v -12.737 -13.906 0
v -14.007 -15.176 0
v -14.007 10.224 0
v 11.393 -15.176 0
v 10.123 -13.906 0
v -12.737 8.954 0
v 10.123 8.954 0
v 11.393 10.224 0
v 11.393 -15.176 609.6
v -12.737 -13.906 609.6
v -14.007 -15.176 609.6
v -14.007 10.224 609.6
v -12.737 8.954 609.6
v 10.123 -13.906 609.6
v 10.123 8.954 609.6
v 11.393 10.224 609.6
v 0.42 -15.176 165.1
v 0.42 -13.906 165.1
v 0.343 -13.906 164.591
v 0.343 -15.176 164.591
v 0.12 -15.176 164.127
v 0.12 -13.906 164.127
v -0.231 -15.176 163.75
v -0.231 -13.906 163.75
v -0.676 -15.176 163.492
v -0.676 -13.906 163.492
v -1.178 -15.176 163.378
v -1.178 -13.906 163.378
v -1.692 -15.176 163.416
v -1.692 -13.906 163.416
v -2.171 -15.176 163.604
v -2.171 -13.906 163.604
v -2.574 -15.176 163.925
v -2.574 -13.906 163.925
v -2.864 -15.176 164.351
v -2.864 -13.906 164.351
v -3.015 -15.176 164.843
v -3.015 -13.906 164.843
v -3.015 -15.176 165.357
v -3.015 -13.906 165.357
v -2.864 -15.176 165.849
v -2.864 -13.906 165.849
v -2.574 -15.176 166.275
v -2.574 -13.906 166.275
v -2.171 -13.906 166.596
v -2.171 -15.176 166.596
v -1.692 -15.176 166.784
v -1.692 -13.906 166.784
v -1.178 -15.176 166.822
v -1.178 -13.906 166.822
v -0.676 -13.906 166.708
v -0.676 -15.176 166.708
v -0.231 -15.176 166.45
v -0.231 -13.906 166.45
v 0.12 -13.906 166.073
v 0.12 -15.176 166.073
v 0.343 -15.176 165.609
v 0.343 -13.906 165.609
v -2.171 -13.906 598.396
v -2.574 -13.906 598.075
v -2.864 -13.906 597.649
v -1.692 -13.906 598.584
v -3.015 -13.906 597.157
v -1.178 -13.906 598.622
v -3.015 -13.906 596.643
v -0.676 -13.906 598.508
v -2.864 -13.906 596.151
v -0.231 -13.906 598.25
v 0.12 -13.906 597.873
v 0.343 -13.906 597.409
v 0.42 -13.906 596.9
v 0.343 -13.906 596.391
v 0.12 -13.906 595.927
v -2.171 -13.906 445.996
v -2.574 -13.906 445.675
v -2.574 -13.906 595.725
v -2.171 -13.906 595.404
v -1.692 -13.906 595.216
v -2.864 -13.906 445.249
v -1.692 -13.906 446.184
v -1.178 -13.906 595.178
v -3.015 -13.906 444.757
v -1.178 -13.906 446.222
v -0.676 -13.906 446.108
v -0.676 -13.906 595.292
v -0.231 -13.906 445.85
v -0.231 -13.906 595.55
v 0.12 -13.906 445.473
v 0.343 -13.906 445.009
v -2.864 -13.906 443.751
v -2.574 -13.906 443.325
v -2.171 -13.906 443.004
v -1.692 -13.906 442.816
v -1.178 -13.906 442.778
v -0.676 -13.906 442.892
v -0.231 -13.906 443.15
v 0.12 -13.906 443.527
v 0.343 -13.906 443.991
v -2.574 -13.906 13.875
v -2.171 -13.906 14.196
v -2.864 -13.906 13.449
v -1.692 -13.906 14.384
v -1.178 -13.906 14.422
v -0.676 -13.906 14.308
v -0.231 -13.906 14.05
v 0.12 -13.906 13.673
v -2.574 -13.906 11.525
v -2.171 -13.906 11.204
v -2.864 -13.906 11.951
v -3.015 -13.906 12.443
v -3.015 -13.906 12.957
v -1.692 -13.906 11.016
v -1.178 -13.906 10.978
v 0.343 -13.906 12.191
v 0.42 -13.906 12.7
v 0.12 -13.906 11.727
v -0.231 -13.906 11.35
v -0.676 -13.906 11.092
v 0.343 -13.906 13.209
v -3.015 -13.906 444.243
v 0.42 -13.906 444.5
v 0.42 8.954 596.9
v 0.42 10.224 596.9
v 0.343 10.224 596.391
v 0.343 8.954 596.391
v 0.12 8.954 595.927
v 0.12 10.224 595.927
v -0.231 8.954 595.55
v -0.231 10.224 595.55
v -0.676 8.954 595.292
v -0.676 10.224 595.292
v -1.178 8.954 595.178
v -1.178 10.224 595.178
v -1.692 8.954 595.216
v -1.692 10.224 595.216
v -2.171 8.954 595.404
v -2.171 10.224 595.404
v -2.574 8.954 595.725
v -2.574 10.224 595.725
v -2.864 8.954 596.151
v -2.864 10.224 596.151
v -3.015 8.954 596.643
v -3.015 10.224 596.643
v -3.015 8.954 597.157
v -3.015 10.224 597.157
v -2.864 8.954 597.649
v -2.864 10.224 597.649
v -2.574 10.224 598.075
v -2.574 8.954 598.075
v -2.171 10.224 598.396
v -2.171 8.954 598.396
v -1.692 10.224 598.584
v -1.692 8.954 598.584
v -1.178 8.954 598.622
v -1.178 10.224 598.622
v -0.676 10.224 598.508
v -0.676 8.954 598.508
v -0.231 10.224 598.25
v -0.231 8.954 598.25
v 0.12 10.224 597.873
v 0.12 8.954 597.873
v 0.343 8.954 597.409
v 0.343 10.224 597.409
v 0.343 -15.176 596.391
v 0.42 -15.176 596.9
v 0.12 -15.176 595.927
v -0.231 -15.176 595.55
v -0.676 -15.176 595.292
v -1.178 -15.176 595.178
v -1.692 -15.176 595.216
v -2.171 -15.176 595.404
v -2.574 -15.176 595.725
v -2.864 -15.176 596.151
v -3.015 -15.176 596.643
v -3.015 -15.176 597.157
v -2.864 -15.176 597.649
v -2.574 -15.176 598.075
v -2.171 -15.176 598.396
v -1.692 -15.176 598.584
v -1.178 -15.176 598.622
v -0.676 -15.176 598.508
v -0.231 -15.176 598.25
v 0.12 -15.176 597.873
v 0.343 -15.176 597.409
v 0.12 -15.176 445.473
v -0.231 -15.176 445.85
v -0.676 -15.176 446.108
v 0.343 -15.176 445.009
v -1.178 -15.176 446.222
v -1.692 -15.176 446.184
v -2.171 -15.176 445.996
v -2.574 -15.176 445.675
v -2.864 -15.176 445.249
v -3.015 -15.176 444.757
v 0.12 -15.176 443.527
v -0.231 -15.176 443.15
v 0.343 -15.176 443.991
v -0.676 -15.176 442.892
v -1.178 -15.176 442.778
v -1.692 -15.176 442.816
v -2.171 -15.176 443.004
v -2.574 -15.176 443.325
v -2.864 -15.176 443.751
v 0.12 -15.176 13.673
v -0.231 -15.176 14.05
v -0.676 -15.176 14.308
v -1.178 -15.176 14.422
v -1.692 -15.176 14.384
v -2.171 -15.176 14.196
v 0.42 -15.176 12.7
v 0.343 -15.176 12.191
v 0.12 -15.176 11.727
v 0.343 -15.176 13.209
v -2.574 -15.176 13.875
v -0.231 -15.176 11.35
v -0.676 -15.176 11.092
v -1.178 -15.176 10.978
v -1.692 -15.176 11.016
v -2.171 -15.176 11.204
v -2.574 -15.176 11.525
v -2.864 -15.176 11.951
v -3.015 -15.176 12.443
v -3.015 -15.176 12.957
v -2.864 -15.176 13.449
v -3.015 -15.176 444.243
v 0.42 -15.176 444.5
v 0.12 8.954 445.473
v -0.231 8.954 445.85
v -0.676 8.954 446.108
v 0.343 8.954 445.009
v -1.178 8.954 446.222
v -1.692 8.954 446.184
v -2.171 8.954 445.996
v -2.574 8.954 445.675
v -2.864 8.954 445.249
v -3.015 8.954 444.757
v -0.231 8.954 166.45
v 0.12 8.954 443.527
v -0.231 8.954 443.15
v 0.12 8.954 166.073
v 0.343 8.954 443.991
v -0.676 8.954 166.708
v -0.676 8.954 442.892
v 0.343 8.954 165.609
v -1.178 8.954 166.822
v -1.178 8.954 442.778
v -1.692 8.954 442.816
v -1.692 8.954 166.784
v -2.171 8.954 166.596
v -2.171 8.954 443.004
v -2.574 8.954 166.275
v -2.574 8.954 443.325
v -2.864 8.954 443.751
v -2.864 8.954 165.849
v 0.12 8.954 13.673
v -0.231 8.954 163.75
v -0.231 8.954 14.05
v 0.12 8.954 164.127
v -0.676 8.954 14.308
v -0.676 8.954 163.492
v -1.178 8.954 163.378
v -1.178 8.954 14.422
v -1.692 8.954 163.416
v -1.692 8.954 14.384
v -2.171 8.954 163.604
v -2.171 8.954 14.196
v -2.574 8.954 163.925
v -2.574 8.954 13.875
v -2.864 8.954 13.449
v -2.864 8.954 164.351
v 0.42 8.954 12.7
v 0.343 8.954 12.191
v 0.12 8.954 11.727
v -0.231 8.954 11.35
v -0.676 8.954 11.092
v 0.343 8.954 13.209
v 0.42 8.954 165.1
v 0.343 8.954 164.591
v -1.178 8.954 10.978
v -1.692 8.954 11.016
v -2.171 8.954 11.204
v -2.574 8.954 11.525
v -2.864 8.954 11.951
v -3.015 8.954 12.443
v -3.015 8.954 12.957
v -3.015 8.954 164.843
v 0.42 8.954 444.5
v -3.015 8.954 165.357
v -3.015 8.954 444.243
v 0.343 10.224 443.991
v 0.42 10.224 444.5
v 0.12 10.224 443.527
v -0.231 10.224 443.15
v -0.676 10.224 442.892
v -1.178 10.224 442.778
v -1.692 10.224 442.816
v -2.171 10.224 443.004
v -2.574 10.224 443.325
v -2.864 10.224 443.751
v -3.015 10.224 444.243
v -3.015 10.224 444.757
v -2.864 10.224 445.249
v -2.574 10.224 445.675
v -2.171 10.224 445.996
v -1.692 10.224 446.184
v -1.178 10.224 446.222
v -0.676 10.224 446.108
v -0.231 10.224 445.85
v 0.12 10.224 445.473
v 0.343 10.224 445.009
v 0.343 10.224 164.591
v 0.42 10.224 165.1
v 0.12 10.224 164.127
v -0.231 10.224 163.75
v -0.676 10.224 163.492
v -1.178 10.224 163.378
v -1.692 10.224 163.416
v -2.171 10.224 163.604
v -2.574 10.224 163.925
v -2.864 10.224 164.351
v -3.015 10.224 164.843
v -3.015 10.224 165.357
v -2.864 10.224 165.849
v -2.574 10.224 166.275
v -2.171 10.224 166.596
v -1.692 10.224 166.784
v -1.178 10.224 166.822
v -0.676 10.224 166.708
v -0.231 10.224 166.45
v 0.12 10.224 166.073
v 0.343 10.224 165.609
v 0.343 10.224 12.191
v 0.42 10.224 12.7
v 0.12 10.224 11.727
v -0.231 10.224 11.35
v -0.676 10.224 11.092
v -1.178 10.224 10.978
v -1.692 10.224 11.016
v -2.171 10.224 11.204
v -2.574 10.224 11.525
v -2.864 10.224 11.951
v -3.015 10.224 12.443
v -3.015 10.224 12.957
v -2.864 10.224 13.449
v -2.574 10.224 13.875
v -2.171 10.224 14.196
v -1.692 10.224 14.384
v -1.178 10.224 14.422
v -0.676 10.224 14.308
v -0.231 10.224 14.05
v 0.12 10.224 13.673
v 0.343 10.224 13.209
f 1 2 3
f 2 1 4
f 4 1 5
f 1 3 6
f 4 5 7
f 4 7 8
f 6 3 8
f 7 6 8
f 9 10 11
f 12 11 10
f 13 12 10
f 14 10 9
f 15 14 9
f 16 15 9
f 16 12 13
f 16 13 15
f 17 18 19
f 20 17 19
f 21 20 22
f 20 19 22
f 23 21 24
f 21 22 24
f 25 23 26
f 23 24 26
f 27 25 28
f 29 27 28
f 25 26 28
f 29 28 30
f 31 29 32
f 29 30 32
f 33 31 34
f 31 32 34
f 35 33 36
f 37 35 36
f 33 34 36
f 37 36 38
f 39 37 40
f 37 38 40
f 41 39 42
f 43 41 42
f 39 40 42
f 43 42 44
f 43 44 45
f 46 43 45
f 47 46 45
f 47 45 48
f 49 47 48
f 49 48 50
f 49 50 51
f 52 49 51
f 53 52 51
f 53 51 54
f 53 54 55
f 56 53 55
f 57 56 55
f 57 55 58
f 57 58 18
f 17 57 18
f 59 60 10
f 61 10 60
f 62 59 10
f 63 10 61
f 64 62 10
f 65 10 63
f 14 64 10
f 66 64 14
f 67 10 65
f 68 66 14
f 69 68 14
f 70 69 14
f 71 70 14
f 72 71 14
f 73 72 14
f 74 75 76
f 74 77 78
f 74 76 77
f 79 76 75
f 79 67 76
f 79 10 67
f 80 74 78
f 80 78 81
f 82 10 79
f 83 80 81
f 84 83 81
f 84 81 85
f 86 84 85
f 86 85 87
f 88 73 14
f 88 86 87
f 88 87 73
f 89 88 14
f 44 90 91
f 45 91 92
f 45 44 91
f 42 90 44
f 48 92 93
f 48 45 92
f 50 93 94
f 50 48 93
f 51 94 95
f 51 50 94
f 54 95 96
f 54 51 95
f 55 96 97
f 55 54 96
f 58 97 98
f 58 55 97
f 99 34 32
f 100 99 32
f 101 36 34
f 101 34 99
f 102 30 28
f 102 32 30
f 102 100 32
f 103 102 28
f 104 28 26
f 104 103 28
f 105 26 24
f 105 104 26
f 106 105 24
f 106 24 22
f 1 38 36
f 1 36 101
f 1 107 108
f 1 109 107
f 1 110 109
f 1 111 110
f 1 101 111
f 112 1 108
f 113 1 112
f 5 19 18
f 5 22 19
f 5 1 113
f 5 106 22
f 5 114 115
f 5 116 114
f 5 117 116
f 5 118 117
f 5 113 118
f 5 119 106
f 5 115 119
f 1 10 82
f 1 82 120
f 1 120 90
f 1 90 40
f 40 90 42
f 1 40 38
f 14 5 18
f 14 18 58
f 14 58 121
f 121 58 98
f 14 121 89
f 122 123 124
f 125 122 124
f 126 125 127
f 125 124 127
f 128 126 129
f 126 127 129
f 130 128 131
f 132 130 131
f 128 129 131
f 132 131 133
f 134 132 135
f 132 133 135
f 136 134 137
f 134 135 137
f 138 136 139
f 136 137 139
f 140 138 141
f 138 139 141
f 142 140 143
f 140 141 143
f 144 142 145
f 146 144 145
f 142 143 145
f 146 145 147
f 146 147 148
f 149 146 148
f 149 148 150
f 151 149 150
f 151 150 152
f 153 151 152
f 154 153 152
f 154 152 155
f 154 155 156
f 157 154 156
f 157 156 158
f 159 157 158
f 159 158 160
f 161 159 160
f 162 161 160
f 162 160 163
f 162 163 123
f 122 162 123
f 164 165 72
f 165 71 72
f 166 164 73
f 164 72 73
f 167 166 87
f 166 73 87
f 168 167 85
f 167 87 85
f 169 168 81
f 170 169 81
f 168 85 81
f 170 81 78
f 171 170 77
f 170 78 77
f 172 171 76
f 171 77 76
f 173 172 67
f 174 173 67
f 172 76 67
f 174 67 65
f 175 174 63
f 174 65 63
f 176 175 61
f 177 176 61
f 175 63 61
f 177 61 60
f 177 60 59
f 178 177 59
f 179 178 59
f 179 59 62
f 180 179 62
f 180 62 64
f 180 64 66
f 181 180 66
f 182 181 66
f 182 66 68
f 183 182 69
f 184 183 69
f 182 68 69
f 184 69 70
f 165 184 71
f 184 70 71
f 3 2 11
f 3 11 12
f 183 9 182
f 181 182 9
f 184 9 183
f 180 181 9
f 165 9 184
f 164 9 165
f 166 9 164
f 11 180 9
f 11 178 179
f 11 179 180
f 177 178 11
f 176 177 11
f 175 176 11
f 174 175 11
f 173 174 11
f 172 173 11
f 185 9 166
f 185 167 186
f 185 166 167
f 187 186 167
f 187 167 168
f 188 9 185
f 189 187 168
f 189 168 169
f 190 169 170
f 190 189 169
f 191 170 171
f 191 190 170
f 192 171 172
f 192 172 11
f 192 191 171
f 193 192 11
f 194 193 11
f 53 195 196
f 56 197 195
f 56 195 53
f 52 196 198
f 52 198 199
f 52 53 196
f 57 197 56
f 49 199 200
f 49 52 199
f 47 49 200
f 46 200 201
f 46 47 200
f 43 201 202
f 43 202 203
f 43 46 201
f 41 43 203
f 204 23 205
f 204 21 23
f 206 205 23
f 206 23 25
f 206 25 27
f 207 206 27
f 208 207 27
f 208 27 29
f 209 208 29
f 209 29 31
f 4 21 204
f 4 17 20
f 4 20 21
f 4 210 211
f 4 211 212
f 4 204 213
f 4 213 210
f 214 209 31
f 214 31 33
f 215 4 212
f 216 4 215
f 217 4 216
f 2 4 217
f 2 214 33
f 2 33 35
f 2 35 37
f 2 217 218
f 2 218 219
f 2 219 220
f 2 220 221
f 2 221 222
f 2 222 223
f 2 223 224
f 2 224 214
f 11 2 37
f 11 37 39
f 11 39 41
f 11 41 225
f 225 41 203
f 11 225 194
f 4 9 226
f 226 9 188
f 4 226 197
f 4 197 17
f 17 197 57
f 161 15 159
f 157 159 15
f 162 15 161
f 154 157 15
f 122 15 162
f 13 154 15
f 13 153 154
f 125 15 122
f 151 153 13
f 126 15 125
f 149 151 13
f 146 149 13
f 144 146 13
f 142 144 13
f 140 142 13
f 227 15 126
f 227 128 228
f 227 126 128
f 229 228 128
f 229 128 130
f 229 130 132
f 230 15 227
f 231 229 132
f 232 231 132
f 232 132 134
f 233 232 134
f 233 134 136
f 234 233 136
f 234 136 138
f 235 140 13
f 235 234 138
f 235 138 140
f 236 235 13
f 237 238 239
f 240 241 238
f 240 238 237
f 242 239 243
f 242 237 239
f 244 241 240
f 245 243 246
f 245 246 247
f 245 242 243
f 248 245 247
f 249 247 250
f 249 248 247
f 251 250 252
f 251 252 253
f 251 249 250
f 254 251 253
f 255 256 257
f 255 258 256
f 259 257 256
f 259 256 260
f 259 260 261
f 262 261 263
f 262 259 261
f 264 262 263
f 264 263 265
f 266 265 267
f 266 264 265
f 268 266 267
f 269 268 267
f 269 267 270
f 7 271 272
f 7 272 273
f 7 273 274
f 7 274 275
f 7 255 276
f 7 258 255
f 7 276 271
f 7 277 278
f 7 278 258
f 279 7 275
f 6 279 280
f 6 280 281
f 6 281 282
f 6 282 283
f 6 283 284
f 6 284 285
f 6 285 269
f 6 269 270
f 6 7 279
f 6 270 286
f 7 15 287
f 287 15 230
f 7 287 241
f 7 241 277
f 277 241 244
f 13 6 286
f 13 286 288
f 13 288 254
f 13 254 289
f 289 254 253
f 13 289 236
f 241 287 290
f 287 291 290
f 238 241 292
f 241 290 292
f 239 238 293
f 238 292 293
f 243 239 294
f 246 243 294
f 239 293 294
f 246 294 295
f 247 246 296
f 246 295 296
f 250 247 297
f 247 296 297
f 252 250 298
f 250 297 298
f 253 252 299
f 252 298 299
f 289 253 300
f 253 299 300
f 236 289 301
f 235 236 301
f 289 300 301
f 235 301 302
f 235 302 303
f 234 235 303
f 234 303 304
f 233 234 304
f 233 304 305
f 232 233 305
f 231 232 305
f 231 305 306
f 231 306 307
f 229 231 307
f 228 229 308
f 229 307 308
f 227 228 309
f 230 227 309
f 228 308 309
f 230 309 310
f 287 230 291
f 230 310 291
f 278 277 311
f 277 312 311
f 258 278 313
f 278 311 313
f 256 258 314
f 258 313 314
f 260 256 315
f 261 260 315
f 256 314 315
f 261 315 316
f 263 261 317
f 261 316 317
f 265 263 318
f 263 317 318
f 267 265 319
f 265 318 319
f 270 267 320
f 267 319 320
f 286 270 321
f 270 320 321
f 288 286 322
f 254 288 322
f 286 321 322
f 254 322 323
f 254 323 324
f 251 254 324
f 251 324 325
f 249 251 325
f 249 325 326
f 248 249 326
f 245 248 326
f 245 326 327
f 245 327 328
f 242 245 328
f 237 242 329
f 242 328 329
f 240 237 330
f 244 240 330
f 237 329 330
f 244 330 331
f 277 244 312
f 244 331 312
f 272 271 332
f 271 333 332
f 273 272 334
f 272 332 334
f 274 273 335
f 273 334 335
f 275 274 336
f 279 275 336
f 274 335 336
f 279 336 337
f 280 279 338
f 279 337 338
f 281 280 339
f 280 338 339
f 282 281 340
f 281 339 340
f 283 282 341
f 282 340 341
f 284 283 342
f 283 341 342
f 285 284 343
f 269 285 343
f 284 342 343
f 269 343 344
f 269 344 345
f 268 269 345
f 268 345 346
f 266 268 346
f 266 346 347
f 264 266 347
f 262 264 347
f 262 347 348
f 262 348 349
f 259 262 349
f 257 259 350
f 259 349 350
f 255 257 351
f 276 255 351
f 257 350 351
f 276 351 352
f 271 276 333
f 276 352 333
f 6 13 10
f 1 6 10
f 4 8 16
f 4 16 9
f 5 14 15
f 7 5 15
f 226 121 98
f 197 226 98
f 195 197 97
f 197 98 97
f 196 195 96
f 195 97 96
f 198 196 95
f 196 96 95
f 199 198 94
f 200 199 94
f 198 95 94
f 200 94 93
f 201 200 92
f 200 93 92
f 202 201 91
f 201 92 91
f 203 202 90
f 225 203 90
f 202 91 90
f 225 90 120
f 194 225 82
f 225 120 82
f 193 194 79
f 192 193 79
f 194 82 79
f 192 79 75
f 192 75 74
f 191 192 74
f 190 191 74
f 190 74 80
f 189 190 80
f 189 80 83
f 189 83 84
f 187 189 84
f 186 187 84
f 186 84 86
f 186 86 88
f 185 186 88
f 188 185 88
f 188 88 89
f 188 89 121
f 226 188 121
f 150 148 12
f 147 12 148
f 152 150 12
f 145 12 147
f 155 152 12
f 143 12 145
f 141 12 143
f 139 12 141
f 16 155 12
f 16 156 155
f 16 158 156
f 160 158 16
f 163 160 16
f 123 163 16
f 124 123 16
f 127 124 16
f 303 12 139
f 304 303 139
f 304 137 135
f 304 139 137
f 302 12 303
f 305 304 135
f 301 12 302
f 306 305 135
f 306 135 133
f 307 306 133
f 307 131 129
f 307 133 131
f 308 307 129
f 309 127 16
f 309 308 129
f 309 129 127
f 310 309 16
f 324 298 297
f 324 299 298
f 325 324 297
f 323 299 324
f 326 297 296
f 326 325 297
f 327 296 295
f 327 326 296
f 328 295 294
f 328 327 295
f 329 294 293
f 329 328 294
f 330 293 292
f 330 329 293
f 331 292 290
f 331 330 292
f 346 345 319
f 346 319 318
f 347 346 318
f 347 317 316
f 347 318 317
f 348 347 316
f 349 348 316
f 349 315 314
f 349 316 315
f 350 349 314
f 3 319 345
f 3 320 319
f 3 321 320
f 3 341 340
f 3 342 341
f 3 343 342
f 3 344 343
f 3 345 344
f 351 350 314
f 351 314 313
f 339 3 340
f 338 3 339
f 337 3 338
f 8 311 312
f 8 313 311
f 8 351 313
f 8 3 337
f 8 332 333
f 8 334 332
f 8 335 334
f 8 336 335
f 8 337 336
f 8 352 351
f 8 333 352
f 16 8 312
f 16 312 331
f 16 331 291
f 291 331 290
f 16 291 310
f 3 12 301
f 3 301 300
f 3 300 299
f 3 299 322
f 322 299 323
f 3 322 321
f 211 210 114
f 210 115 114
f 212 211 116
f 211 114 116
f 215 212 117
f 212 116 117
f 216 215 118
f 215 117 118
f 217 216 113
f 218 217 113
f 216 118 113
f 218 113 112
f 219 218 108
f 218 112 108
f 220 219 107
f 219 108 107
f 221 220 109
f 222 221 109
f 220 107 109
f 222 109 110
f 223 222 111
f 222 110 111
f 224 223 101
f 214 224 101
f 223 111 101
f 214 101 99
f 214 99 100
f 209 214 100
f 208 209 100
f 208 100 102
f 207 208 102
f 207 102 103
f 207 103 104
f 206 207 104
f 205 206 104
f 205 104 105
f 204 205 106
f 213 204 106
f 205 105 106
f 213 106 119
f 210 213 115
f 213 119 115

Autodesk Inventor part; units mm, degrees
ref_plane "YZ Plane" through (0, 0, 0) normal (1, 0, 0) x (0, 1, 0)
ref_plane "XZ Plane" through (0, 0, 0) normal (0, 1, 0) x (-1, 0, 0)
ref_plane "XY Plane" through (0, 0, 0) normal (0, 0, 1) x (1, 0, 0)
sketch "Sketch1" plane through (0, 0, 0) normal (0, 0, 1) x (1, 0, 0)
  line L0 (-14.0074, 10.2243) -> (11.3926, 10.2243)
  line L1 (11.3926, 10.2243) -> (11.3926, -15.1757)
  line L2 (11.3926, -15.1757) -> (-14.0074, -15.1757)
  line L3 (-14.0074, -15.1757) -> (-14.0074, 10.2243)
  line L4 (10.1226, 8.9543) -> (-12.7374, 8.9543)
  line L5 (-12.7374, 8.9543) -> (-12.7374, -13.9057)
  line L6 (-12.7374, -13.9057) -> (10.1226, -13.9057)
  line L7 (10.1226, -13.9057) -> (10.1226, 8.9543)
  point P0 (0, 0)
  dimension "d0" = 25.4
  dimension "d1" = 1.27
extrude "Extrusion2" add sketch "Sketch1" along normal blind 609.6
sketch "Sketch2" plane through (-14.0074, 10.2243, 0) normal (0, 1, 0) x (1, 0, 0)
  circle A0 centre (12.7, -165.1) radius 1.7272
  circle A1 centre (12.7, -444.5) radius 1.7272
  circle A2 centre (12.7, -596.9) radius 1.7272
  circle A3 centre (12.7, -12.7) radius 1.7272
  line L0 (12.7, -275.2188) -> (12.7, -289.6377) construction
  line L1 (25.4, -609.6) -> (0, -609.6) projected
  line L2 (25.4, 0) -> (25.4, -609.6) projected
  line L3 (25.4, 0) -> (0, 0) projected
  point P0 (14.0074, 0)
  dimension "d6" = 3.4544
  dimension "d7" = 12.7
  dimension "d8" = 12.7
  dimension "d9" = 12.7
  dimension "d11" = 152.4
  dimension "d15" = 152.4
extrude "Extrusion3" cut sketch "Sketch2" against normal through all
equation "\"d4\" = d2"
equation "\"d11\" = d14"
equation "\"d15\" = d14"
equation "\"d2\" = 609.6"
equation "\"d14\" = 152.4"
properties part number "24 in 1x1 for drive"
